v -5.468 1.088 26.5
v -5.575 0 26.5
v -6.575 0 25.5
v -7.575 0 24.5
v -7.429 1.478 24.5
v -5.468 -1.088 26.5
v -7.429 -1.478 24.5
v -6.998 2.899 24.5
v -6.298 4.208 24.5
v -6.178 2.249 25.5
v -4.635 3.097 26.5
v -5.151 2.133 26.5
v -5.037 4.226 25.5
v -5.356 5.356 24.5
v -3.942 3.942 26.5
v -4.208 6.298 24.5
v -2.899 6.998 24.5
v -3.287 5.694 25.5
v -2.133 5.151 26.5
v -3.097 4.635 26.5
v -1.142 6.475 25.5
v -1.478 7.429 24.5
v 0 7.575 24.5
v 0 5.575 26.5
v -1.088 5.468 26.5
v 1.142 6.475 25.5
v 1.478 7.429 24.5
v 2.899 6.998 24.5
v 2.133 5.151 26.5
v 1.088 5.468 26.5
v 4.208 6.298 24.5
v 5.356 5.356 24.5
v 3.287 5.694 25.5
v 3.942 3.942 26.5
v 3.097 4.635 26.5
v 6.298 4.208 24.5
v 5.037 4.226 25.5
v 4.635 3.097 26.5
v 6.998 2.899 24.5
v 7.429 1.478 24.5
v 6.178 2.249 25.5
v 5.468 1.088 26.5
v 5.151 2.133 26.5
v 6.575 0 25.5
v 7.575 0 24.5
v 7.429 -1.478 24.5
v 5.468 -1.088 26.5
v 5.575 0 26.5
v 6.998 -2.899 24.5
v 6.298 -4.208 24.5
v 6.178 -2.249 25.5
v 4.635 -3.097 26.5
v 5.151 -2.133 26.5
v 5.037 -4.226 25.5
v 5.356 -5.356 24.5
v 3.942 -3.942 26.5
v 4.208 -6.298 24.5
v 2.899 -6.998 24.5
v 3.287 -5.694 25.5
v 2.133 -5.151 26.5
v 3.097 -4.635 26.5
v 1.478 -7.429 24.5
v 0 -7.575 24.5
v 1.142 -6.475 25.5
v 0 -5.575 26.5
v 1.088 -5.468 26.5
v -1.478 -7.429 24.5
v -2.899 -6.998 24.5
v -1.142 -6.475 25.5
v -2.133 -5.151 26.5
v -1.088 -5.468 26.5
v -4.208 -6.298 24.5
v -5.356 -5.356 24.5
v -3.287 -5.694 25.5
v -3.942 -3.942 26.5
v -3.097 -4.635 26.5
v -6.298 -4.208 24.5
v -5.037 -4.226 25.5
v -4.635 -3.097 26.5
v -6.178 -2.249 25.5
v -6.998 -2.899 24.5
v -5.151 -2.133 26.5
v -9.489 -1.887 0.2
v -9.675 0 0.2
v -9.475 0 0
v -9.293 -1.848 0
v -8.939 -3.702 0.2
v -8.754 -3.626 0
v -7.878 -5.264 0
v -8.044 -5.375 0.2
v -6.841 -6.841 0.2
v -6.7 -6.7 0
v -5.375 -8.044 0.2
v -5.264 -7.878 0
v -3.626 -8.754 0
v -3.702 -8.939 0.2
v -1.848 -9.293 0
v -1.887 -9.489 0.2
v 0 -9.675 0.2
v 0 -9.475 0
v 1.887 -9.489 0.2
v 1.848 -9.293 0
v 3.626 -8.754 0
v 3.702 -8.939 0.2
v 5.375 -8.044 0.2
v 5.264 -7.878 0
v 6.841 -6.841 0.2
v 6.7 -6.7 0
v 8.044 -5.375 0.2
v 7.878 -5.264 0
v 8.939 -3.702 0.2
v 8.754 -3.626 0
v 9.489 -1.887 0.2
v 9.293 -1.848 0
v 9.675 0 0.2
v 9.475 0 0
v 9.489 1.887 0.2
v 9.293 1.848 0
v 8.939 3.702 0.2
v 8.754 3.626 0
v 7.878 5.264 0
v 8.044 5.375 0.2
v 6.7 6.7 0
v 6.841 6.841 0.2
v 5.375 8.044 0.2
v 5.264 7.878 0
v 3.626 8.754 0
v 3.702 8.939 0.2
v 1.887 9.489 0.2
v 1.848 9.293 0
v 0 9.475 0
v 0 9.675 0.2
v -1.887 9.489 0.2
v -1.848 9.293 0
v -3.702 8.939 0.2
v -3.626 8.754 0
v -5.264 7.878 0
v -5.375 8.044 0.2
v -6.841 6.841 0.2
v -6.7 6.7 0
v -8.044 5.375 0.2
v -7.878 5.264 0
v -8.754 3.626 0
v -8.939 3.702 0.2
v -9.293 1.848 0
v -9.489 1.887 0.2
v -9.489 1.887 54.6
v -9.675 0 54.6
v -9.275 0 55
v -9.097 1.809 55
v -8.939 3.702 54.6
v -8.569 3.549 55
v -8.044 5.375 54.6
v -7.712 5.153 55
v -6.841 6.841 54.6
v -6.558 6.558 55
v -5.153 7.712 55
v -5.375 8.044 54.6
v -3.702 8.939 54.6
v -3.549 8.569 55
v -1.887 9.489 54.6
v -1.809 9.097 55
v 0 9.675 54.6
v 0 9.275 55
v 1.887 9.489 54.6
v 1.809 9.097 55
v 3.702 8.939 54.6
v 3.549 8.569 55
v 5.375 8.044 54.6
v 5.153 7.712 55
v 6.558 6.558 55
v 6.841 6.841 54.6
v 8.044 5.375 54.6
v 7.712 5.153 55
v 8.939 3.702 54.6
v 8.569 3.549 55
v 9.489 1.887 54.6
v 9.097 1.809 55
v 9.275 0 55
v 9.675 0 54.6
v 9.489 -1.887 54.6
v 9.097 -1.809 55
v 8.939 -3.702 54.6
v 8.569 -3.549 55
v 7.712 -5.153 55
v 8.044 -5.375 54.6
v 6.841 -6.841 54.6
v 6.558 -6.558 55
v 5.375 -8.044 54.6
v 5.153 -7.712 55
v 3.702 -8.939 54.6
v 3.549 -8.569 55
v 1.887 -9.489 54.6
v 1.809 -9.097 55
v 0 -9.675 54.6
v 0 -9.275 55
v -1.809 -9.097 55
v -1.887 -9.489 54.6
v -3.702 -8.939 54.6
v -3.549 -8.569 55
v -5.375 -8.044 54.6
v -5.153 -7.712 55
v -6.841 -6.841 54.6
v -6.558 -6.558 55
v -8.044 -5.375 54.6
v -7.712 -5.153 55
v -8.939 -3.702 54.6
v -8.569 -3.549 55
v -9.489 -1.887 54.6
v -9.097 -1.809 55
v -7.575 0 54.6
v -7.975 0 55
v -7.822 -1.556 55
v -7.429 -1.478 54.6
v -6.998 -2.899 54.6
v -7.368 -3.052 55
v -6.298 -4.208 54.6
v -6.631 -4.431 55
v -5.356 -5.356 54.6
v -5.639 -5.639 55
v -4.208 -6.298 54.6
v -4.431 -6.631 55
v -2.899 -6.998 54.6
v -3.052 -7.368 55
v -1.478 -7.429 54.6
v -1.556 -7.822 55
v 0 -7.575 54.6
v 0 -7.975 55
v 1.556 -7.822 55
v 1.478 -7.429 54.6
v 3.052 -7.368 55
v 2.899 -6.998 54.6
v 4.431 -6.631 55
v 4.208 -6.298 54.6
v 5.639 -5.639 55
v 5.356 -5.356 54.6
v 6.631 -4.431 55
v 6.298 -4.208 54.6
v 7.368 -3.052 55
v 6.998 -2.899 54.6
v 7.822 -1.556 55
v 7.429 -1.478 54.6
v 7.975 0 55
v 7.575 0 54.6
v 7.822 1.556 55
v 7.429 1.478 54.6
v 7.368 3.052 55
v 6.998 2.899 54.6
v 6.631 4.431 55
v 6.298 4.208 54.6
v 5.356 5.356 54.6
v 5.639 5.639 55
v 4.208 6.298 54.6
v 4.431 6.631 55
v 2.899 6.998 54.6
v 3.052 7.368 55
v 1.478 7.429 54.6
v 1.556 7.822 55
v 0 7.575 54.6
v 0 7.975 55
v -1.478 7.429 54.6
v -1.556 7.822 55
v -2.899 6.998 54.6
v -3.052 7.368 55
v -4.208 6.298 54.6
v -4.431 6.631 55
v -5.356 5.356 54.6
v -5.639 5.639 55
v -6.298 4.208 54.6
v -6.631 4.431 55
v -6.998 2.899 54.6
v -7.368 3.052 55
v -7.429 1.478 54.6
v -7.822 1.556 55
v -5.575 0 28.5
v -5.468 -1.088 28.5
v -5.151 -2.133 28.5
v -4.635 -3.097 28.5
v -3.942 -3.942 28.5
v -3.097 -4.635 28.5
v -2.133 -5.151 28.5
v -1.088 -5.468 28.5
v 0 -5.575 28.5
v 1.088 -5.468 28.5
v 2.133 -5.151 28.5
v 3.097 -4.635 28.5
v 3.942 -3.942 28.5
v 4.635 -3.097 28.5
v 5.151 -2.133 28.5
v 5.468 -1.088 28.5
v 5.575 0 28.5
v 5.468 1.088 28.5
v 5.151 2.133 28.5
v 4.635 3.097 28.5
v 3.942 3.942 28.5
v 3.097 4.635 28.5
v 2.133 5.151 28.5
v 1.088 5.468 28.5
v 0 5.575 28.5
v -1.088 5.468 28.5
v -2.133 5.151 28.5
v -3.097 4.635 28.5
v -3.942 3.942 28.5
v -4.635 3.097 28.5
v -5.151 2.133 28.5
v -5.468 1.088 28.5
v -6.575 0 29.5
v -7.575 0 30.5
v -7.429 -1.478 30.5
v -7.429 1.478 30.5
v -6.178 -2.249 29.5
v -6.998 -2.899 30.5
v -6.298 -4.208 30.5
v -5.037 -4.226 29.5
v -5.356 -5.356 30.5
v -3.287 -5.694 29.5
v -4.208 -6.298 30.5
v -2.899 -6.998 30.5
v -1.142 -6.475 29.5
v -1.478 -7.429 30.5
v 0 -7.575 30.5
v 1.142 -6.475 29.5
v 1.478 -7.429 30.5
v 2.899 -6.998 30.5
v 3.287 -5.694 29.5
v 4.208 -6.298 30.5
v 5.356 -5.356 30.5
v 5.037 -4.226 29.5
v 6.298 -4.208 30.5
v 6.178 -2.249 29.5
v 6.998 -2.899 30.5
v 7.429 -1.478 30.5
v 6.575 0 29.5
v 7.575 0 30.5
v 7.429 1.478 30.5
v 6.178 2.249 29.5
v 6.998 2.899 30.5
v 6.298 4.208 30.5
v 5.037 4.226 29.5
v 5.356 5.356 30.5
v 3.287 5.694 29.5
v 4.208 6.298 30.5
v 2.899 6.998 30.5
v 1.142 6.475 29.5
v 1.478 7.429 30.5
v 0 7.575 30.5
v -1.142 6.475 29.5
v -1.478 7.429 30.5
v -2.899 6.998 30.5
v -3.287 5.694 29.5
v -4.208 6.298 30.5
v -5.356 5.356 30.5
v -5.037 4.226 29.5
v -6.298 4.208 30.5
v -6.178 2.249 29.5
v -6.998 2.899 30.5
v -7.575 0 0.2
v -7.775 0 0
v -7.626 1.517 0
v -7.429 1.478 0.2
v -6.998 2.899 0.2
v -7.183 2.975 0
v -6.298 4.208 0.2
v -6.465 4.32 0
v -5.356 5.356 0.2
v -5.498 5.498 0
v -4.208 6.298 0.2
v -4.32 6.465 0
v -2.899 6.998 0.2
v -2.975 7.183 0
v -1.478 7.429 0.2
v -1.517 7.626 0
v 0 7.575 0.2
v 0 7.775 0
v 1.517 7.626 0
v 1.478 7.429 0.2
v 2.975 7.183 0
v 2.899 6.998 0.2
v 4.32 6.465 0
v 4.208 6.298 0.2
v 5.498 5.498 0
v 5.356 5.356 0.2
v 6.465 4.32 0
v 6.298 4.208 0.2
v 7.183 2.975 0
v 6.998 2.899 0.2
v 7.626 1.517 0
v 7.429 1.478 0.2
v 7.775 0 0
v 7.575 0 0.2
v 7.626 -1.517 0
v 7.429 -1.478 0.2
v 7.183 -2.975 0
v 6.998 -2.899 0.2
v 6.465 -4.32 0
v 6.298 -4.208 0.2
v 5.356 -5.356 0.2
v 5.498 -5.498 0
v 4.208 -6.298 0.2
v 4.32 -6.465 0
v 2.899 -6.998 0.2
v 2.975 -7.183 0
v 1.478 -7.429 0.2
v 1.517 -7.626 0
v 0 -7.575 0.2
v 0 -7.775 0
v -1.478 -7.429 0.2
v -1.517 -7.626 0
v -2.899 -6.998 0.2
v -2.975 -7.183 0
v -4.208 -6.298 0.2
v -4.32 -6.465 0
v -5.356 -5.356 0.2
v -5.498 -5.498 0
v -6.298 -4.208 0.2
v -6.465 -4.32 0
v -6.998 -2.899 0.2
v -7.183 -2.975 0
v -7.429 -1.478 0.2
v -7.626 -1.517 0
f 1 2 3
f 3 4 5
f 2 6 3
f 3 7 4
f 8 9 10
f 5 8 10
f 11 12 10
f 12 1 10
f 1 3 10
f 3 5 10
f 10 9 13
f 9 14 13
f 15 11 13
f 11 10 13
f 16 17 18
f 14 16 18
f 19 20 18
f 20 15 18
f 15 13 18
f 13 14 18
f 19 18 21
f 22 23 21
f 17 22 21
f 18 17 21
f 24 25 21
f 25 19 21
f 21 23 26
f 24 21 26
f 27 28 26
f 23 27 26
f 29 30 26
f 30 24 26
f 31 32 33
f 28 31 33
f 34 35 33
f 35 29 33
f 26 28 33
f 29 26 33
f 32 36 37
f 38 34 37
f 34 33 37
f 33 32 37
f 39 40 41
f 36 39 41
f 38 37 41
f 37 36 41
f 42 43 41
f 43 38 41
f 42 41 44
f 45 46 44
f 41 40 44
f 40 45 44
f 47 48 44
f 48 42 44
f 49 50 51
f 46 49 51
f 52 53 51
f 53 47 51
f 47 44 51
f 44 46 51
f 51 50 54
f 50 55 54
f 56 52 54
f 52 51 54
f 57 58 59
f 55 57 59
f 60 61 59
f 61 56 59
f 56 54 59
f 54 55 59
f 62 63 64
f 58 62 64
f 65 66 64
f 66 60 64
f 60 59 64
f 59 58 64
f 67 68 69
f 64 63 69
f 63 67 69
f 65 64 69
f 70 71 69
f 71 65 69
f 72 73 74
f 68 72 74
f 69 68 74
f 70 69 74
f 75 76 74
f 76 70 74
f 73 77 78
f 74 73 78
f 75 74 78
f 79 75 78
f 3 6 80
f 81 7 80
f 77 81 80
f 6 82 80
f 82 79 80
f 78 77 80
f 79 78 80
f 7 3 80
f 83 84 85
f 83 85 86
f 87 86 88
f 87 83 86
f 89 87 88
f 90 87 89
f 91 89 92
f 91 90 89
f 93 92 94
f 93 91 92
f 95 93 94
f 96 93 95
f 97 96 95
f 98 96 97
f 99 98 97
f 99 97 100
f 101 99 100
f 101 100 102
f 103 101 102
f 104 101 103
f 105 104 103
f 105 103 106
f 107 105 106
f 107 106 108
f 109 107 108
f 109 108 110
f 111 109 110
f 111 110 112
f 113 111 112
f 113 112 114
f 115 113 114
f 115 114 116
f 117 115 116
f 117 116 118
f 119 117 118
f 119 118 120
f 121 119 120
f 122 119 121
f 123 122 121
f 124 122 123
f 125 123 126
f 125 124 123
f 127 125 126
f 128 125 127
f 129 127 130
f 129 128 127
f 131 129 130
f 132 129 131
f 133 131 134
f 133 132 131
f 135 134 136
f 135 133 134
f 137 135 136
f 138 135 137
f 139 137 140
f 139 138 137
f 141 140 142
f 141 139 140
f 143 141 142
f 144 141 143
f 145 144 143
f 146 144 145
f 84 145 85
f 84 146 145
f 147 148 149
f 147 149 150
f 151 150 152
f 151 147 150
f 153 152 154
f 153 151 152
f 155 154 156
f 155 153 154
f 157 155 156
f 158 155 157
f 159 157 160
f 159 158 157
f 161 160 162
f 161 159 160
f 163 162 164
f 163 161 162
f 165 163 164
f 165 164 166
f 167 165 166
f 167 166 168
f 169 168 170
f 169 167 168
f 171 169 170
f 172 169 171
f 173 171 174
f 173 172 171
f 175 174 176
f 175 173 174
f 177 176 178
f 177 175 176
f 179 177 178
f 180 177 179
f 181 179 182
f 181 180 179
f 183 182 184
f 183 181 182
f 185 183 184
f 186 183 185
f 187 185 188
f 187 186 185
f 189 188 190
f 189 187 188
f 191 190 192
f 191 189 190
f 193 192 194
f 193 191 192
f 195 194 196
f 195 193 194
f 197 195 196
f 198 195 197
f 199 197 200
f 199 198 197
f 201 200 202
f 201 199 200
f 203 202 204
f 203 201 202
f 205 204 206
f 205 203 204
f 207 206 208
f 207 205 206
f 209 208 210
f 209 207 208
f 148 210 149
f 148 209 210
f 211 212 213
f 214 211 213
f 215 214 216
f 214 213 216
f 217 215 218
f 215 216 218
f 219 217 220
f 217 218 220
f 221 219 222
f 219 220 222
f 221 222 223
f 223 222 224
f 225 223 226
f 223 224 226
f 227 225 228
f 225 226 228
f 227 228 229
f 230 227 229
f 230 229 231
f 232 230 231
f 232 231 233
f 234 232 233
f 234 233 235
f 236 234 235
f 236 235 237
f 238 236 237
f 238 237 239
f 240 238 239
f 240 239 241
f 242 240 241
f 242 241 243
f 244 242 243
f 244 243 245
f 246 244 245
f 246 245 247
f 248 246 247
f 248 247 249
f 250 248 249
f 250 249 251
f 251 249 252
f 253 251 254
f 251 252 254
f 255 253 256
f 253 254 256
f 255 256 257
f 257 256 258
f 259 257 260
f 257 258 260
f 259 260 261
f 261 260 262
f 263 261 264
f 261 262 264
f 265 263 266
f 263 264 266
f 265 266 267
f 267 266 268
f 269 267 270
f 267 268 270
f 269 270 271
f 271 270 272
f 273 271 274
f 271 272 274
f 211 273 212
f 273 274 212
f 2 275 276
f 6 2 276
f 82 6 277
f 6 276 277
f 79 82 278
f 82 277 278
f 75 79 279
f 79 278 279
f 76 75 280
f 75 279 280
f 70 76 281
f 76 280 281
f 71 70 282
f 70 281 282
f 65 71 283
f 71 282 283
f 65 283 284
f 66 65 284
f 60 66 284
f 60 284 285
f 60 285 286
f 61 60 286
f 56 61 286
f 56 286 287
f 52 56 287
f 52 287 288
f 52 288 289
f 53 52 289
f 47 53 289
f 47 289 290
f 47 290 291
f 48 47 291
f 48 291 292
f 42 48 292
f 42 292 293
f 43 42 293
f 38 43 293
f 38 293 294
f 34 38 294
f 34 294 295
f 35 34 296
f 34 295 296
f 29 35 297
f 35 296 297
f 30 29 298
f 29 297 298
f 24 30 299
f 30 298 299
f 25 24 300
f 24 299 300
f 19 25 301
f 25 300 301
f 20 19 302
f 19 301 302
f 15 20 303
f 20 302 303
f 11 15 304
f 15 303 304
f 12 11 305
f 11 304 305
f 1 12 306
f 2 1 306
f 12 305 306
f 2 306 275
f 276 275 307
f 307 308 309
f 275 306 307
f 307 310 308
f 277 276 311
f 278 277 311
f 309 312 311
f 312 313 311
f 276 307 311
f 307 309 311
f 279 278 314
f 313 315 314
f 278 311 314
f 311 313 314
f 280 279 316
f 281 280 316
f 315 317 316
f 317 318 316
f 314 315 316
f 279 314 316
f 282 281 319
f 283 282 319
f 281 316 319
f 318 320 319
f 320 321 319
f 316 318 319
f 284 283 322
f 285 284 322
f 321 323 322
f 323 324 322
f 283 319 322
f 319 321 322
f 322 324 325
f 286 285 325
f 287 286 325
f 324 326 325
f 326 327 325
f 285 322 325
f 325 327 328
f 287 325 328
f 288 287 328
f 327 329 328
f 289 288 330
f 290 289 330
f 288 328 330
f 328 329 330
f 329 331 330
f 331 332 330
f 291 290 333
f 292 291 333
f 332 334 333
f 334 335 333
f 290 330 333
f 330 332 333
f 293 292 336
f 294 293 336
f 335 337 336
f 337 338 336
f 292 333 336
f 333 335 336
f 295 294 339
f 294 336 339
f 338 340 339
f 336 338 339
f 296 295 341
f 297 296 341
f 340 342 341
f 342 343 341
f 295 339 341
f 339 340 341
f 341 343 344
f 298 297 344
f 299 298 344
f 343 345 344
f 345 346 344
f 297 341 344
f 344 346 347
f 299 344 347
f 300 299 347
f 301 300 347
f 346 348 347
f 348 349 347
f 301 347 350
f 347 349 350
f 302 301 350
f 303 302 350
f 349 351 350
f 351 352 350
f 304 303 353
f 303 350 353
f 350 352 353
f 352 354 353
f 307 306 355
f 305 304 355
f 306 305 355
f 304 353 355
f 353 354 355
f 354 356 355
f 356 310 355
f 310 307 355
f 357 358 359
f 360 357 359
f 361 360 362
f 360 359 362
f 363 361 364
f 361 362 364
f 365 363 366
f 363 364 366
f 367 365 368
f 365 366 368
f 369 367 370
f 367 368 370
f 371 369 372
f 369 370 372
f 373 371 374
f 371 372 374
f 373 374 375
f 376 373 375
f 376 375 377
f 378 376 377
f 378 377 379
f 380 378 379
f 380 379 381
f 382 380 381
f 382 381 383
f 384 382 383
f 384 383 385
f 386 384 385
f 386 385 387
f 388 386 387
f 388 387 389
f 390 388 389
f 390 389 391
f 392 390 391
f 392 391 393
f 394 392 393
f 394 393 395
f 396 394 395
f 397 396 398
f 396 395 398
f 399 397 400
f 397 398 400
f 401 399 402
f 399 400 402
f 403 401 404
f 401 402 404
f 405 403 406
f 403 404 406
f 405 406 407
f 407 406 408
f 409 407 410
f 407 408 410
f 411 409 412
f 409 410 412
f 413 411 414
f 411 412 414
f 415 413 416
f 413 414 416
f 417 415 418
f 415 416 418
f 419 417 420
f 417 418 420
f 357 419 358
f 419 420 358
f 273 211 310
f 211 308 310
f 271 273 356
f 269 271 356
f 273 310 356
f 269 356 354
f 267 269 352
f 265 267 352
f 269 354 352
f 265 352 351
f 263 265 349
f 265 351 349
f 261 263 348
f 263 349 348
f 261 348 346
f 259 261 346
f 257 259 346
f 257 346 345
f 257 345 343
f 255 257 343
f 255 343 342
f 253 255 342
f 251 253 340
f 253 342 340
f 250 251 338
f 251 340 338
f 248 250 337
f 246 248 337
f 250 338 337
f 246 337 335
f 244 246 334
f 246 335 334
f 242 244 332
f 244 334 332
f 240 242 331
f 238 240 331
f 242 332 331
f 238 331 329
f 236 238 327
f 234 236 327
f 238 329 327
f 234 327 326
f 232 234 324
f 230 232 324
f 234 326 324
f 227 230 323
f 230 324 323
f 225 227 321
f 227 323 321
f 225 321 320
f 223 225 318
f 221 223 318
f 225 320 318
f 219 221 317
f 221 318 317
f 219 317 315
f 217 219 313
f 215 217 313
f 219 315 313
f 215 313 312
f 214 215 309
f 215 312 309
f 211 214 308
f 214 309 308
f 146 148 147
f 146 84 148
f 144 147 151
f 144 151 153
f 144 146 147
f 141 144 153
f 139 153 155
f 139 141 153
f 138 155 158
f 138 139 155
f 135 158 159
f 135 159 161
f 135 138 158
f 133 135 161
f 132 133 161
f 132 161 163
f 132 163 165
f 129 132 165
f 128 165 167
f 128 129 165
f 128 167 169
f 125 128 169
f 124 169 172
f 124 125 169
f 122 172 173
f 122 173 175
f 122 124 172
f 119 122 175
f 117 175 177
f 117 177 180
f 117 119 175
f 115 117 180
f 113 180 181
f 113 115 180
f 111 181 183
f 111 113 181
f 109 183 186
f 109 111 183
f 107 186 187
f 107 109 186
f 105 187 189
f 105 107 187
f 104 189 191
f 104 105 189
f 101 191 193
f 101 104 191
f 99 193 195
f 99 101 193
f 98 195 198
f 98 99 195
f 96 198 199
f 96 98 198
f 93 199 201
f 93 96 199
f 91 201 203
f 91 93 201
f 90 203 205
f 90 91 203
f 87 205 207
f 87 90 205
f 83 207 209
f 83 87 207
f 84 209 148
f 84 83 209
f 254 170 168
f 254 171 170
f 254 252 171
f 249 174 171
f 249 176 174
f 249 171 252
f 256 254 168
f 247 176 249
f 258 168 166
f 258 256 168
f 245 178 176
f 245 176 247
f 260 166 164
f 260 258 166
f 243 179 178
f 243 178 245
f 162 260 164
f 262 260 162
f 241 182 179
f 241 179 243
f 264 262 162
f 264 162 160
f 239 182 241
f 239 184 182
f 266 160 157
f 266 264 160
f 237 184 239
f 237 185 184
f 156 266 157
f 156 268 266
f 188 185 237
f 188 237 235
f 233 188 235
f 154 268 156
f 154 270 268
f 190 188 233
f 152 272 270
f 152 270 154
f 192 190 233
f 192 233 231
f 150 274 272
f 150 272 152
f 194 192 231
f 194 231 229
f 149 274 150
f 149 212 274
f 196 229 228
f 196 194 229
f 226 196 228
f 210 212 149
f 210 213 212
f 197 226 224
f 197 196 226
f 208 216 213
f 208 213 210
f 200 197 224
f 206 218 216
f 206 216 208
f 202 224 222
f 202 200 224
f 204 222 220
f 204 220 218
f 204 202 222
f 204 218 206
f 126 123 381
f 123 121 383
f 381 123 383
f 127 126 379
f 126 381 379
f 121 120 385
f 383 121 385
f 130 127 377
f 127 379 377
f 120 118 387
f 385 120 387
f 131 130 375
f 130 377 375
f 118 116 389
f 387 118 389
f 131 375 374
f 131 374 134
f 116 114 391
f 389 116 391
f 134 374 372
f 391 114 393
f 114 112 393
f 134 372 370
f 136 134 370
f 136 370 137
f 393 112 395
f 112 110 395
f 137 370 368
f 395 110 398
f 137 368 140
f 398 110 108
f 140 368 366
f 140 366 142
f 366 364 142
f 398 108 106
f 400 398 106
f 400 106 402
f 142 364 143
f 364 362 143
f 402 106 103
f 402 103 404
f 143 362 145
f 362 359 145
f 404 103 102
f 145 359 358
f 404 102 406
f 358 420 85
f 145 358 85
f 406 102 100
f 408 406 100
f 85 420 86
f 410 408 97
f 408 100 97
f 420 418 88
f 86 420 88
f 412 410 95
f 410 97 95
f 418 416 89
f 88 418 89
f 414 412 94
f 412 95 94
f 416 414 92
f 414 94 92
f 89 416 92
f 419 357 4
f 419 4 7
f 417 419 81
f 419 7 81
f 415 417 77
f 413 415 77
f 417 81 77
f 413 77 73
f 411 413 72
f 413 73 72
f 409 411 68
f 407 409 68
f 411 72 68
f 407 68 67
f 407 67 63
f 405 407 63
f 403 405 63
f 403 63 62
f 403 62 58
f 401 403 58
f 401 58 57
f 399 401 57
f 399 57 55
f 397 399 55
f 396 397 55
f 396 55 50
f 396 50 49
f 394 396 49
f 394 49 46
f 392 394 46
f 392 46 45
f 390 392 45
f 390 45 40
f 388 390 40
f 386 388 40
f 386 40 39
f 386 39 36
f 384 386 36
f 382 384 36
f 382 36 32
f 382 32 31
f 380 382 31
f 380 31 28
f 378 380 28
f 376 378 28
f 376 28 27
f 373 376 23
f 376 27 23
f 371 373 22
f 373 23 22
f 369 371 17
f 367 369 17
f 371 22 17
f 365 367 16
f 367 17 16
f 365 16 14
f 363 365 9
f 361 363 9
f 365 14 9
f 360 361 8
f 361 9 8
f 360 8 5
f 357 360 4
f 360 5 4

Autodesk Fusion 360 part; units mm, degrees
sketch "Sketch1" plane through (0, 0, 0) normal (0, 1, 0) x (1, 0, 0)
  line L0 (0, 0) -> (0, -55)
  line L1 (0, -55) -> (-9.675, -55)
  line L2 (-9.675, -55) -> (-9.675, 0)
  line L3 (-9.675, 0) -> (0, 0)
  line L4 (-7.5, -55) -> (-7.5, -30.5)
  line L5 (-7.5, 0) -> (-7.5, -24.5)
  line L6 (-7.5, -24.5) -> (0, -24.5)
  line L7 (-7.5, -30.5) -> (0, -30.5)
  line L8 (-7.5, -24.5) -> (-7.5, -30.5)
  line L9 (-5.5, -24.5) -> (-5.5, -30.5)
  dimension "d1" = 19.35
  dimension "d2" = 55
  dimension "d5" = 24.5
  dimension "d6" = 24.5
  dimension "d7" = 15
  dimension "d27" = 2
revolve "Revolve1" add sketch "Sketch1" angle 360 about axis through (0, 0, 0) along (0, 0, 1) contours L1 L2 L3 L4 L5 L8 | L6 L7 L8 L9
move_face "OffsetFaces2" offset -0.075 3 faces at (-7.4627, 0.7468, 46.8333) (-7.4907, 0.3738, 16.3333) (-5.4932, 0.2742, 26.5)
chamfer "Chamfer5" distance 0.4 angle 45 2 edges at (7.0624, -2.7392, 55) (-9.0203, 3.4986, 55)
chamfer "Chamfer6" distance 0.2 angle 45 2 edges at (7.0624, -2.7392, 0) (-9.0203, 3.4986, 0)
chamfer "Chamfer7" distance 2 angle 45 2 edges at (5.1977, -2.016, 24.5) (5.1977, -2.016, 30.5)
equation "d6 = d5"
equation "tolerance = ( 0.15 / 2 ) * 1 mm"
equation "d28 = -tolerance"
